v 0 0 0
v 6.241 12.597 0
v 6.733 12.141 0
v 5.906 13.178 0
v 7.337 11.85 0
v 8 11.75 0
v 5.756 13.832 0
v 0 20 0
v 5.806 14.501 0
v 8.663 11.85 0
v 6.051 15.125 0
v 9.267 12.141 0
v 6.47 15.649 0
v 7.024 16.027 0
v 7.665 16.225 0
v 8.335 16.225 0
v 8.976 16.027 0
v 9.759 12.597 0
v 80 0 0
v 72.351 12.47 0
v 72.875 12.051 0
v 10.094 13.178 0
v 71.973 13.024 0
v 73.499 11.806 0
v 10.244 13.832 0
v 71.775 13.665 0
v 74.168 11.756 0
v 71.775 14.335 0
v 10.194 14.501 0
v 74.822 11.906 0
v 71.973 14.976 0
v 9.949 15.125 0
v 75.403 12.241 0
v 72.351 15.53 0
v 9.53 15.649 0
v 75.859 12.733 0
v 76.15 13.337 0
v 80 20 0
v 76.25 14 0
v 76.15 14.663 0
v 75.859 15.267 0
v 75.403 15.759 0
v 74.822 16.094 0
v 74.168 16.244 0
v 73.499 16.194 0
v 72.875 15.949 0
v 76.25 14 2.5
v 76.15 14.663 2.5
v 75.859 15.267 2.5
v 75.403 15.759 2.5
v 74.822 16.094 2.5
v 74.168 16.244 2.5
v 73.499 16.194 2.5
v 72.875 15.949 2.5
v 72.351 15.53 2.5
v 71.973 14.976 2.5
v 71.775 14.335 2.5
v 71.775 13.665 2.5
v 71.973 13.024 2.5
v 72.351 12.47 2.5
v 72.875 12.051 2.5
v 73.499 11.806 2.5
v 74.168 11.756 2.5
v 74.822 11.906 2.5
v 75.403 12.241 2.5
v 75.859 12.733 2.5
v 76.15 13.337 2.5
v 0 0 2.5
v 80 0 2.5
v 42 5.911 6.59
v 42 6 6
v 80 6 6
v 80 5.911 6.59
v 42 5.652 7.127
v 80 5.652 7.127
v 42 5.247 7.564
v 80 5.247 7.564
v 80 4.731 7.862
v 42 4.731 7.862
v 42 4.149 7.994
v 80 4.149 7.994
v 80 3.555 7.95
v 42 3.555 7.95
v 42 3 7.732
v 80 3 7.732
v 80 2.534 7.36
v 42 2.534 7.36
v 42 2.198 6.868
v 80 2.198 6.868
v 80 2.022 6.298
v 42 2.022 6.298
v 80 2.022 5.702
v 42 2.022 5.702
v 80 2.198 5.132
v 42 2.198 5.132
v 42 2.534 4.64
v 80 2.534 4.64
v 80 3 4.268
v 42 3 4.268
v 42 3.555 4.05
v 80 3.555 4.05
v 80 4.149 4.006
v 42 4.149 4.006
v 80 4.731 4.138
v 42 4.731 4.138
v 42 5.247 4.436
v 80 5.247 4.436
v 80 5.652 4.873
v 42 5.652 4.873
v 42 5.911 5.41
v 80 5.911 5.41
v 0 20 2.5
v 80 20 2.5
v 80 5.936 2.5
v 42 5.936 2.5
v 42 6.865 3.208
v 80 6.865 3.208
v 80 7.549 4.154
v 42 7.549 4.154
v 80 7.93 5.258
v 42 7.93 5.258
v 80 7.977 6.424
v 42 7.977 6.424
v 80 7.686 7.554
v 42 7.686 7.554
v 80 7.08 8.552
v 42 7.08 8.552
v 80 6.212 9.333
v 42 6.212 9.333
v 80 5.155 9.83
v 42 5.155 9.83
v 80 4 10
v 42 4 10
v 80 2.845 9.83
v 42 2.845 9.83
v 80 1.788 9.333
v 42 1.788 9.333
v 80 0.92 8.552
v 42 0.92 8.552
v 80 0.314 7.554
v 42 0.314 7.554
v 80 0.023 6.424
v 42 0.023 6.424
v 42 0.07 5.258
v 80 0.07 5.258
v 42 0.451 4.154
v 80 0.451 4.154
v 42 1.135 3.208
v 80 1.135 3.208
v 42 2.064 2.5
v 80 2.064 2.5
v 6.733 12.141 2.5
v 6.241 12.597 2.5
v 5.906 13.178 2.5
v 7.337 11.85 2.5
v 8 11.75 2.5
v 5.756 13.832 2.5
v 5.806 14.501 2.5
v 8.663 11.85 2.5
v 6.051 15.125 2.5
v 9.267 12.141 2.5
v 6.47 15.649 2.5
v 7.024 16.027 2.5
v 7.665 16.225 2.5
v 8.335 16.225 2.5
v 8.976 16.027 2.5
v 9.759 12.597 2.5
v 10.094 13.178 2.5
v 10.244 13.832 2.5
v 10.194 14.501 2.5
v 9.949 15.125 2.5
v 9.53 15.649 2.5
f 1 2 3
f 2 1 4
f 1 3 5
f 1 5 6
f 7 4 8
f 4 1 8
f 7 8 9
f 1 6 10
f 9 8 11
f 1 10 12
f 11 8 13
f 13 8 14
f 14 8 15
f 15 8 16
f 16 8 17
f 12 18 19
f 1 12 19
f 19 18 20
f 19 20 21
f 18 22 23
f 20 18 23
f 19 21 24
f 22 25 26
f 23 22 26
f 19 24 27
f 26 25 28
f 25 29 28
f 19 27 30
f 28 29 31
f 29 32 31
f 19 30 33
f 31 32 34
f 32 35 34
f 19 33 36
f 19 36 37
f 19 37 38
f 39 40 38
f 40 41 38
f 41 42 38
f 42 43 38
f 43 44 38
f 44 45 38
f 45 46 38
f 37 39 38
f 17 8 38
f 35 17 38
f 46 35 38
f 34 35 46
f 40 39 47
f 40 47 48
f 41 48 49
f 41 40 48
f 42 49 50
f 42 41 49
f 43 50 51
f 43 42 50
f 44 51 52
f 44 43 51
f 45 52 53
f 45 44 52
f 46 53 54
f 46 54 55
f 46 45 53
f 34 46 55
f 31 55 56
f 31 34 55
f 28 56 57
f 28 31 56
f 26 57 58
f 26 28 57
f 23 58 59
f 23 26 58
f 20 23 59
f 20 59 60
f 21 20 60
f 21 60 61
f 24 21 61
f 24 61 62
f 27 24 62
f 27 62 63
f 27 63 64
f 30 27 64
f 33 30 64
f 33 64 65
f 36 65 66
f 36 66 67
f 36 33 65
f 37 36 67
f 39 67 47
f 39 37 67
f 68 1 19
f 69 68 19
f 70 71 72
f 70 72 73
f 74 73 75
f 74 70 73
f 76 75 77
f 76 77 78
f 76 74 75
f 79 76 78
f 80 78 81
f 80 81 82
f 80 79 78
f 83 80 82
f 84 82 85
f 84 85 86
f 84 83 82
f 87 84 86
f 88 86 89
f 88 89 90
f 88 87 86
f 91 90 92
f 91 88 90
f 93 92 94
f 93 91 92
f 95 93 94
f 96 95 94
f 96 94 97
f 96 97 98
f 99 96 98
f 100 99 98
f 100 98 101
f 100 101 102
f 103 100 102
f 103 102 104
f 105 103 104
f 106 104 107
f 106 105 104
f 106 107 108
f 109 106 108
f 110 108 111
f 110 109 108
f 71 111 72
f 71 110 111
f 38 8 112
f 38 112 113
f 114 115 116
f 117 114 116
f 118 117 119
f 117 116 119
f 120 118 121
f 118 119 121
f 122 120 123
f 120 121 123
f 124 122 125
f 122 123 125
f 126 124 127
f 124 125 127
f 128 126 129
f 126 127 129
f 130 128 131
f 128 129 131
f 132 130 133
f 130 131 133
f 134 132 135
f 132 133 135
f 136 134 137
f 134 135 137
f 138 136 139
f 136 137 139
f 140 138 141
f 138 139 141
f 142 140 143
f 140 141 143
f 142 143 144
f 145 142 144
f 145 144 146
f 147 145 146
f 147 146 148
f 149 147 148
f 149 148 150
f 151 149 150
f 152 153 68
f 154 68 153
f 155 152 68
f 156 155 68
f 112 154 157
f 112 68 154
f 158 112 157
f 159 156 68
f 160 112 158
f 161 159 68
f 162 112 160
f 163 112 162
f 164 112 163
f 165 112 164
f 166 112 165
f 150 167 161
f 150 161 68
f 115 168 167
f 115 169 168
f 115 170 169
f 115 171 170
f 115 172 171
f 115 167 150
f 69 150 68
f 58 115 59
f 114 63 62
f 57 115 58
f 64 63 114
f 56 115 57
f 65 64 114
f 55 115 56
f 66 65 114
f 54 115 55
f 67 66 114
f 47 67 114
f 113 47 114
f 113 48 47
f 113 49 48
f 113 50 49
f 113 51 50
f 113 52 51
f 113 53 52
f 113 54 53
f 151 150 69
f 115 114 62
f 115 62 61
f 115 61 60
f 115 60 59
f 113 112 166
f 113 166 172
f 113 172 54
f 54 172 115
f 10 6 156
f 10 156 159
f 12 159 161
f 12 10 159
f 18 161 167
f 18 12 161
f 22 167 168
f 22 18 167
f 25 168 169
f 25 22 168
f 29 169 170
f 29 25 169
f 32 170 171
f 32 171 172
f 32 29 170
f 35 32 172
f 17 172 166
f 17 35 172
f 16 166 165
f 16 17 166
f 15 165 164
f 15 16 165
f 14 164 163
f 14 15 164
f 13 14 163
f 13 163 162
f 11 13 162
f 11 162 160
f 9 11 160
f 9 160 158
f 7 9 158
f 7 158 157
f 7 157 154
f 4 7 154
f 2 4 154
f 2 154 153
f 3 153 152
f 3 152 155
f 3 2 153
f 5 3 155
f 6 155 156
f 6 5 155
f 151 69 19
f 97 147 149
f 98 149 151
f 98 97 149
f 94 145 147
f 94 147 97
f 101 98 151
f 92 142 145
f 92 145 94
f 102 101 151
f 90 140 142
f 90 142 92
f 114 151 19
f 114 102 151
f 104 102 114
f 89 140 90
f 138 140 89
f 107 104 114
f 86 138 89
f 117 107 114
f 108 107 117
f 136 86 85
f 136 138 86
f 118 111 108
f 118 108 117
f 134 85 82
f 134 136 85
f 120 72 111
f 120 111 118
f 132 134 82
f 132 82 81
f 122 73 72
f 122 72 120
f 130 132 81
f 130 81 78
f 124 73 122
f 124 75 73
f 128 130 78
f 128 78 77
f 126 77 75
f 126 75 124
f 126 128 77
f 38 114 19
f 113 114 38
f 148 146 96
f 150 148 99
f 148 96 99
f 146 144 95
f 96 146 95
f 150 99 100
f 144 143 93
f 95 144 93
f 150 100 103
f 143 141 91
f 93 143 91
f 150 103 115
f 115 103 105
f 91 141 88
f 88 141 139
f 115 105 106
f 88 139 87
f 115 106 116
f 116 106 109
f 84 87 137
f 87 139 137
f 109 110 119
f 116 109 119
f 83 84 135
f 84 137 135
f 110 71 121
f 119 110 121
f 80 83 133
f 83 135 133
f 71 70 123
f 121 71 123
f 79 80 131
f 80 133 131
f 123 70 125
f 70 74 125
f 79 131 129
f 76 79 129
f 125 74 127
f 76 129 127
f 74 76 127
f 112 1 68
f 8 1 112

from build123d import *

# Parameters (mm, degrees)
BOX_W             = 80
BOX_H             = 20
BOX_DEPTH         = 2.5
CYLINDER_R        = 4
CYLINDER_DEPTH    = 38
CYLINDER001_R     = 2
CYLINDER001_DEPTH = 38
CYLINDER002_R     = 2.25
CYLINDER002_DEPTH = 2.5
CYLINDER003_R     = 2.25
CYLINDER003_DEPTH = 2.5


with BuildPart() as part:
    # Box → Box (join)
    with BuildSketch(Plane.XY):
        with Locations((40, 10)):
            Rectangle(BOX_W, BOX_H)
    extrude(amount=BOX_DEPTH)

    # Cylinder → Cylinder (join)
    with BuildSketch(Plane(origin=(42, 4, 6), x_dir=(0, 1, 0), z_dir=(1, 0, 0))):
        Circle(CYLINDER_R)
    extrude(amount=CYLINDER_DEPTH)

    # Cylinder001 → Cylinder001 (cut)
    with BuildSketch(Plane(origin=(42, 4, 6), x_dir=(0, 1, 0), z_dir=(1, 0, 0))):
        Circle(CYLINDER001_R)
    extrude(amount=CYLINDER001_DEPTH, mode=Mode.SUBTRACT)

    # Cylinder002 → Cylinder002 (cut)
    with BuildSketch(Plane(origin=(8, 14, 0), x_dir=(0, -1, 0), z_dir=(0, 0, 1))):
        Circle(CYLINDER002_R)
    extrude(amount=CYLINDER002_DEPTH, mode=Mode.SUBTRACT)

    # Cylinder003 → Cylinder003 (cut)
    with BuildSketch(Plane(origin=(74, 14, 0), x_dir=(1, 0, 0), z_dir=(0, 0, 1))):
        Circle(CYLINDER003_R)
    extrude(amount=CYLINDER003_DEPTH, mode=Mode.SUBTRACT)


solid = part.part
